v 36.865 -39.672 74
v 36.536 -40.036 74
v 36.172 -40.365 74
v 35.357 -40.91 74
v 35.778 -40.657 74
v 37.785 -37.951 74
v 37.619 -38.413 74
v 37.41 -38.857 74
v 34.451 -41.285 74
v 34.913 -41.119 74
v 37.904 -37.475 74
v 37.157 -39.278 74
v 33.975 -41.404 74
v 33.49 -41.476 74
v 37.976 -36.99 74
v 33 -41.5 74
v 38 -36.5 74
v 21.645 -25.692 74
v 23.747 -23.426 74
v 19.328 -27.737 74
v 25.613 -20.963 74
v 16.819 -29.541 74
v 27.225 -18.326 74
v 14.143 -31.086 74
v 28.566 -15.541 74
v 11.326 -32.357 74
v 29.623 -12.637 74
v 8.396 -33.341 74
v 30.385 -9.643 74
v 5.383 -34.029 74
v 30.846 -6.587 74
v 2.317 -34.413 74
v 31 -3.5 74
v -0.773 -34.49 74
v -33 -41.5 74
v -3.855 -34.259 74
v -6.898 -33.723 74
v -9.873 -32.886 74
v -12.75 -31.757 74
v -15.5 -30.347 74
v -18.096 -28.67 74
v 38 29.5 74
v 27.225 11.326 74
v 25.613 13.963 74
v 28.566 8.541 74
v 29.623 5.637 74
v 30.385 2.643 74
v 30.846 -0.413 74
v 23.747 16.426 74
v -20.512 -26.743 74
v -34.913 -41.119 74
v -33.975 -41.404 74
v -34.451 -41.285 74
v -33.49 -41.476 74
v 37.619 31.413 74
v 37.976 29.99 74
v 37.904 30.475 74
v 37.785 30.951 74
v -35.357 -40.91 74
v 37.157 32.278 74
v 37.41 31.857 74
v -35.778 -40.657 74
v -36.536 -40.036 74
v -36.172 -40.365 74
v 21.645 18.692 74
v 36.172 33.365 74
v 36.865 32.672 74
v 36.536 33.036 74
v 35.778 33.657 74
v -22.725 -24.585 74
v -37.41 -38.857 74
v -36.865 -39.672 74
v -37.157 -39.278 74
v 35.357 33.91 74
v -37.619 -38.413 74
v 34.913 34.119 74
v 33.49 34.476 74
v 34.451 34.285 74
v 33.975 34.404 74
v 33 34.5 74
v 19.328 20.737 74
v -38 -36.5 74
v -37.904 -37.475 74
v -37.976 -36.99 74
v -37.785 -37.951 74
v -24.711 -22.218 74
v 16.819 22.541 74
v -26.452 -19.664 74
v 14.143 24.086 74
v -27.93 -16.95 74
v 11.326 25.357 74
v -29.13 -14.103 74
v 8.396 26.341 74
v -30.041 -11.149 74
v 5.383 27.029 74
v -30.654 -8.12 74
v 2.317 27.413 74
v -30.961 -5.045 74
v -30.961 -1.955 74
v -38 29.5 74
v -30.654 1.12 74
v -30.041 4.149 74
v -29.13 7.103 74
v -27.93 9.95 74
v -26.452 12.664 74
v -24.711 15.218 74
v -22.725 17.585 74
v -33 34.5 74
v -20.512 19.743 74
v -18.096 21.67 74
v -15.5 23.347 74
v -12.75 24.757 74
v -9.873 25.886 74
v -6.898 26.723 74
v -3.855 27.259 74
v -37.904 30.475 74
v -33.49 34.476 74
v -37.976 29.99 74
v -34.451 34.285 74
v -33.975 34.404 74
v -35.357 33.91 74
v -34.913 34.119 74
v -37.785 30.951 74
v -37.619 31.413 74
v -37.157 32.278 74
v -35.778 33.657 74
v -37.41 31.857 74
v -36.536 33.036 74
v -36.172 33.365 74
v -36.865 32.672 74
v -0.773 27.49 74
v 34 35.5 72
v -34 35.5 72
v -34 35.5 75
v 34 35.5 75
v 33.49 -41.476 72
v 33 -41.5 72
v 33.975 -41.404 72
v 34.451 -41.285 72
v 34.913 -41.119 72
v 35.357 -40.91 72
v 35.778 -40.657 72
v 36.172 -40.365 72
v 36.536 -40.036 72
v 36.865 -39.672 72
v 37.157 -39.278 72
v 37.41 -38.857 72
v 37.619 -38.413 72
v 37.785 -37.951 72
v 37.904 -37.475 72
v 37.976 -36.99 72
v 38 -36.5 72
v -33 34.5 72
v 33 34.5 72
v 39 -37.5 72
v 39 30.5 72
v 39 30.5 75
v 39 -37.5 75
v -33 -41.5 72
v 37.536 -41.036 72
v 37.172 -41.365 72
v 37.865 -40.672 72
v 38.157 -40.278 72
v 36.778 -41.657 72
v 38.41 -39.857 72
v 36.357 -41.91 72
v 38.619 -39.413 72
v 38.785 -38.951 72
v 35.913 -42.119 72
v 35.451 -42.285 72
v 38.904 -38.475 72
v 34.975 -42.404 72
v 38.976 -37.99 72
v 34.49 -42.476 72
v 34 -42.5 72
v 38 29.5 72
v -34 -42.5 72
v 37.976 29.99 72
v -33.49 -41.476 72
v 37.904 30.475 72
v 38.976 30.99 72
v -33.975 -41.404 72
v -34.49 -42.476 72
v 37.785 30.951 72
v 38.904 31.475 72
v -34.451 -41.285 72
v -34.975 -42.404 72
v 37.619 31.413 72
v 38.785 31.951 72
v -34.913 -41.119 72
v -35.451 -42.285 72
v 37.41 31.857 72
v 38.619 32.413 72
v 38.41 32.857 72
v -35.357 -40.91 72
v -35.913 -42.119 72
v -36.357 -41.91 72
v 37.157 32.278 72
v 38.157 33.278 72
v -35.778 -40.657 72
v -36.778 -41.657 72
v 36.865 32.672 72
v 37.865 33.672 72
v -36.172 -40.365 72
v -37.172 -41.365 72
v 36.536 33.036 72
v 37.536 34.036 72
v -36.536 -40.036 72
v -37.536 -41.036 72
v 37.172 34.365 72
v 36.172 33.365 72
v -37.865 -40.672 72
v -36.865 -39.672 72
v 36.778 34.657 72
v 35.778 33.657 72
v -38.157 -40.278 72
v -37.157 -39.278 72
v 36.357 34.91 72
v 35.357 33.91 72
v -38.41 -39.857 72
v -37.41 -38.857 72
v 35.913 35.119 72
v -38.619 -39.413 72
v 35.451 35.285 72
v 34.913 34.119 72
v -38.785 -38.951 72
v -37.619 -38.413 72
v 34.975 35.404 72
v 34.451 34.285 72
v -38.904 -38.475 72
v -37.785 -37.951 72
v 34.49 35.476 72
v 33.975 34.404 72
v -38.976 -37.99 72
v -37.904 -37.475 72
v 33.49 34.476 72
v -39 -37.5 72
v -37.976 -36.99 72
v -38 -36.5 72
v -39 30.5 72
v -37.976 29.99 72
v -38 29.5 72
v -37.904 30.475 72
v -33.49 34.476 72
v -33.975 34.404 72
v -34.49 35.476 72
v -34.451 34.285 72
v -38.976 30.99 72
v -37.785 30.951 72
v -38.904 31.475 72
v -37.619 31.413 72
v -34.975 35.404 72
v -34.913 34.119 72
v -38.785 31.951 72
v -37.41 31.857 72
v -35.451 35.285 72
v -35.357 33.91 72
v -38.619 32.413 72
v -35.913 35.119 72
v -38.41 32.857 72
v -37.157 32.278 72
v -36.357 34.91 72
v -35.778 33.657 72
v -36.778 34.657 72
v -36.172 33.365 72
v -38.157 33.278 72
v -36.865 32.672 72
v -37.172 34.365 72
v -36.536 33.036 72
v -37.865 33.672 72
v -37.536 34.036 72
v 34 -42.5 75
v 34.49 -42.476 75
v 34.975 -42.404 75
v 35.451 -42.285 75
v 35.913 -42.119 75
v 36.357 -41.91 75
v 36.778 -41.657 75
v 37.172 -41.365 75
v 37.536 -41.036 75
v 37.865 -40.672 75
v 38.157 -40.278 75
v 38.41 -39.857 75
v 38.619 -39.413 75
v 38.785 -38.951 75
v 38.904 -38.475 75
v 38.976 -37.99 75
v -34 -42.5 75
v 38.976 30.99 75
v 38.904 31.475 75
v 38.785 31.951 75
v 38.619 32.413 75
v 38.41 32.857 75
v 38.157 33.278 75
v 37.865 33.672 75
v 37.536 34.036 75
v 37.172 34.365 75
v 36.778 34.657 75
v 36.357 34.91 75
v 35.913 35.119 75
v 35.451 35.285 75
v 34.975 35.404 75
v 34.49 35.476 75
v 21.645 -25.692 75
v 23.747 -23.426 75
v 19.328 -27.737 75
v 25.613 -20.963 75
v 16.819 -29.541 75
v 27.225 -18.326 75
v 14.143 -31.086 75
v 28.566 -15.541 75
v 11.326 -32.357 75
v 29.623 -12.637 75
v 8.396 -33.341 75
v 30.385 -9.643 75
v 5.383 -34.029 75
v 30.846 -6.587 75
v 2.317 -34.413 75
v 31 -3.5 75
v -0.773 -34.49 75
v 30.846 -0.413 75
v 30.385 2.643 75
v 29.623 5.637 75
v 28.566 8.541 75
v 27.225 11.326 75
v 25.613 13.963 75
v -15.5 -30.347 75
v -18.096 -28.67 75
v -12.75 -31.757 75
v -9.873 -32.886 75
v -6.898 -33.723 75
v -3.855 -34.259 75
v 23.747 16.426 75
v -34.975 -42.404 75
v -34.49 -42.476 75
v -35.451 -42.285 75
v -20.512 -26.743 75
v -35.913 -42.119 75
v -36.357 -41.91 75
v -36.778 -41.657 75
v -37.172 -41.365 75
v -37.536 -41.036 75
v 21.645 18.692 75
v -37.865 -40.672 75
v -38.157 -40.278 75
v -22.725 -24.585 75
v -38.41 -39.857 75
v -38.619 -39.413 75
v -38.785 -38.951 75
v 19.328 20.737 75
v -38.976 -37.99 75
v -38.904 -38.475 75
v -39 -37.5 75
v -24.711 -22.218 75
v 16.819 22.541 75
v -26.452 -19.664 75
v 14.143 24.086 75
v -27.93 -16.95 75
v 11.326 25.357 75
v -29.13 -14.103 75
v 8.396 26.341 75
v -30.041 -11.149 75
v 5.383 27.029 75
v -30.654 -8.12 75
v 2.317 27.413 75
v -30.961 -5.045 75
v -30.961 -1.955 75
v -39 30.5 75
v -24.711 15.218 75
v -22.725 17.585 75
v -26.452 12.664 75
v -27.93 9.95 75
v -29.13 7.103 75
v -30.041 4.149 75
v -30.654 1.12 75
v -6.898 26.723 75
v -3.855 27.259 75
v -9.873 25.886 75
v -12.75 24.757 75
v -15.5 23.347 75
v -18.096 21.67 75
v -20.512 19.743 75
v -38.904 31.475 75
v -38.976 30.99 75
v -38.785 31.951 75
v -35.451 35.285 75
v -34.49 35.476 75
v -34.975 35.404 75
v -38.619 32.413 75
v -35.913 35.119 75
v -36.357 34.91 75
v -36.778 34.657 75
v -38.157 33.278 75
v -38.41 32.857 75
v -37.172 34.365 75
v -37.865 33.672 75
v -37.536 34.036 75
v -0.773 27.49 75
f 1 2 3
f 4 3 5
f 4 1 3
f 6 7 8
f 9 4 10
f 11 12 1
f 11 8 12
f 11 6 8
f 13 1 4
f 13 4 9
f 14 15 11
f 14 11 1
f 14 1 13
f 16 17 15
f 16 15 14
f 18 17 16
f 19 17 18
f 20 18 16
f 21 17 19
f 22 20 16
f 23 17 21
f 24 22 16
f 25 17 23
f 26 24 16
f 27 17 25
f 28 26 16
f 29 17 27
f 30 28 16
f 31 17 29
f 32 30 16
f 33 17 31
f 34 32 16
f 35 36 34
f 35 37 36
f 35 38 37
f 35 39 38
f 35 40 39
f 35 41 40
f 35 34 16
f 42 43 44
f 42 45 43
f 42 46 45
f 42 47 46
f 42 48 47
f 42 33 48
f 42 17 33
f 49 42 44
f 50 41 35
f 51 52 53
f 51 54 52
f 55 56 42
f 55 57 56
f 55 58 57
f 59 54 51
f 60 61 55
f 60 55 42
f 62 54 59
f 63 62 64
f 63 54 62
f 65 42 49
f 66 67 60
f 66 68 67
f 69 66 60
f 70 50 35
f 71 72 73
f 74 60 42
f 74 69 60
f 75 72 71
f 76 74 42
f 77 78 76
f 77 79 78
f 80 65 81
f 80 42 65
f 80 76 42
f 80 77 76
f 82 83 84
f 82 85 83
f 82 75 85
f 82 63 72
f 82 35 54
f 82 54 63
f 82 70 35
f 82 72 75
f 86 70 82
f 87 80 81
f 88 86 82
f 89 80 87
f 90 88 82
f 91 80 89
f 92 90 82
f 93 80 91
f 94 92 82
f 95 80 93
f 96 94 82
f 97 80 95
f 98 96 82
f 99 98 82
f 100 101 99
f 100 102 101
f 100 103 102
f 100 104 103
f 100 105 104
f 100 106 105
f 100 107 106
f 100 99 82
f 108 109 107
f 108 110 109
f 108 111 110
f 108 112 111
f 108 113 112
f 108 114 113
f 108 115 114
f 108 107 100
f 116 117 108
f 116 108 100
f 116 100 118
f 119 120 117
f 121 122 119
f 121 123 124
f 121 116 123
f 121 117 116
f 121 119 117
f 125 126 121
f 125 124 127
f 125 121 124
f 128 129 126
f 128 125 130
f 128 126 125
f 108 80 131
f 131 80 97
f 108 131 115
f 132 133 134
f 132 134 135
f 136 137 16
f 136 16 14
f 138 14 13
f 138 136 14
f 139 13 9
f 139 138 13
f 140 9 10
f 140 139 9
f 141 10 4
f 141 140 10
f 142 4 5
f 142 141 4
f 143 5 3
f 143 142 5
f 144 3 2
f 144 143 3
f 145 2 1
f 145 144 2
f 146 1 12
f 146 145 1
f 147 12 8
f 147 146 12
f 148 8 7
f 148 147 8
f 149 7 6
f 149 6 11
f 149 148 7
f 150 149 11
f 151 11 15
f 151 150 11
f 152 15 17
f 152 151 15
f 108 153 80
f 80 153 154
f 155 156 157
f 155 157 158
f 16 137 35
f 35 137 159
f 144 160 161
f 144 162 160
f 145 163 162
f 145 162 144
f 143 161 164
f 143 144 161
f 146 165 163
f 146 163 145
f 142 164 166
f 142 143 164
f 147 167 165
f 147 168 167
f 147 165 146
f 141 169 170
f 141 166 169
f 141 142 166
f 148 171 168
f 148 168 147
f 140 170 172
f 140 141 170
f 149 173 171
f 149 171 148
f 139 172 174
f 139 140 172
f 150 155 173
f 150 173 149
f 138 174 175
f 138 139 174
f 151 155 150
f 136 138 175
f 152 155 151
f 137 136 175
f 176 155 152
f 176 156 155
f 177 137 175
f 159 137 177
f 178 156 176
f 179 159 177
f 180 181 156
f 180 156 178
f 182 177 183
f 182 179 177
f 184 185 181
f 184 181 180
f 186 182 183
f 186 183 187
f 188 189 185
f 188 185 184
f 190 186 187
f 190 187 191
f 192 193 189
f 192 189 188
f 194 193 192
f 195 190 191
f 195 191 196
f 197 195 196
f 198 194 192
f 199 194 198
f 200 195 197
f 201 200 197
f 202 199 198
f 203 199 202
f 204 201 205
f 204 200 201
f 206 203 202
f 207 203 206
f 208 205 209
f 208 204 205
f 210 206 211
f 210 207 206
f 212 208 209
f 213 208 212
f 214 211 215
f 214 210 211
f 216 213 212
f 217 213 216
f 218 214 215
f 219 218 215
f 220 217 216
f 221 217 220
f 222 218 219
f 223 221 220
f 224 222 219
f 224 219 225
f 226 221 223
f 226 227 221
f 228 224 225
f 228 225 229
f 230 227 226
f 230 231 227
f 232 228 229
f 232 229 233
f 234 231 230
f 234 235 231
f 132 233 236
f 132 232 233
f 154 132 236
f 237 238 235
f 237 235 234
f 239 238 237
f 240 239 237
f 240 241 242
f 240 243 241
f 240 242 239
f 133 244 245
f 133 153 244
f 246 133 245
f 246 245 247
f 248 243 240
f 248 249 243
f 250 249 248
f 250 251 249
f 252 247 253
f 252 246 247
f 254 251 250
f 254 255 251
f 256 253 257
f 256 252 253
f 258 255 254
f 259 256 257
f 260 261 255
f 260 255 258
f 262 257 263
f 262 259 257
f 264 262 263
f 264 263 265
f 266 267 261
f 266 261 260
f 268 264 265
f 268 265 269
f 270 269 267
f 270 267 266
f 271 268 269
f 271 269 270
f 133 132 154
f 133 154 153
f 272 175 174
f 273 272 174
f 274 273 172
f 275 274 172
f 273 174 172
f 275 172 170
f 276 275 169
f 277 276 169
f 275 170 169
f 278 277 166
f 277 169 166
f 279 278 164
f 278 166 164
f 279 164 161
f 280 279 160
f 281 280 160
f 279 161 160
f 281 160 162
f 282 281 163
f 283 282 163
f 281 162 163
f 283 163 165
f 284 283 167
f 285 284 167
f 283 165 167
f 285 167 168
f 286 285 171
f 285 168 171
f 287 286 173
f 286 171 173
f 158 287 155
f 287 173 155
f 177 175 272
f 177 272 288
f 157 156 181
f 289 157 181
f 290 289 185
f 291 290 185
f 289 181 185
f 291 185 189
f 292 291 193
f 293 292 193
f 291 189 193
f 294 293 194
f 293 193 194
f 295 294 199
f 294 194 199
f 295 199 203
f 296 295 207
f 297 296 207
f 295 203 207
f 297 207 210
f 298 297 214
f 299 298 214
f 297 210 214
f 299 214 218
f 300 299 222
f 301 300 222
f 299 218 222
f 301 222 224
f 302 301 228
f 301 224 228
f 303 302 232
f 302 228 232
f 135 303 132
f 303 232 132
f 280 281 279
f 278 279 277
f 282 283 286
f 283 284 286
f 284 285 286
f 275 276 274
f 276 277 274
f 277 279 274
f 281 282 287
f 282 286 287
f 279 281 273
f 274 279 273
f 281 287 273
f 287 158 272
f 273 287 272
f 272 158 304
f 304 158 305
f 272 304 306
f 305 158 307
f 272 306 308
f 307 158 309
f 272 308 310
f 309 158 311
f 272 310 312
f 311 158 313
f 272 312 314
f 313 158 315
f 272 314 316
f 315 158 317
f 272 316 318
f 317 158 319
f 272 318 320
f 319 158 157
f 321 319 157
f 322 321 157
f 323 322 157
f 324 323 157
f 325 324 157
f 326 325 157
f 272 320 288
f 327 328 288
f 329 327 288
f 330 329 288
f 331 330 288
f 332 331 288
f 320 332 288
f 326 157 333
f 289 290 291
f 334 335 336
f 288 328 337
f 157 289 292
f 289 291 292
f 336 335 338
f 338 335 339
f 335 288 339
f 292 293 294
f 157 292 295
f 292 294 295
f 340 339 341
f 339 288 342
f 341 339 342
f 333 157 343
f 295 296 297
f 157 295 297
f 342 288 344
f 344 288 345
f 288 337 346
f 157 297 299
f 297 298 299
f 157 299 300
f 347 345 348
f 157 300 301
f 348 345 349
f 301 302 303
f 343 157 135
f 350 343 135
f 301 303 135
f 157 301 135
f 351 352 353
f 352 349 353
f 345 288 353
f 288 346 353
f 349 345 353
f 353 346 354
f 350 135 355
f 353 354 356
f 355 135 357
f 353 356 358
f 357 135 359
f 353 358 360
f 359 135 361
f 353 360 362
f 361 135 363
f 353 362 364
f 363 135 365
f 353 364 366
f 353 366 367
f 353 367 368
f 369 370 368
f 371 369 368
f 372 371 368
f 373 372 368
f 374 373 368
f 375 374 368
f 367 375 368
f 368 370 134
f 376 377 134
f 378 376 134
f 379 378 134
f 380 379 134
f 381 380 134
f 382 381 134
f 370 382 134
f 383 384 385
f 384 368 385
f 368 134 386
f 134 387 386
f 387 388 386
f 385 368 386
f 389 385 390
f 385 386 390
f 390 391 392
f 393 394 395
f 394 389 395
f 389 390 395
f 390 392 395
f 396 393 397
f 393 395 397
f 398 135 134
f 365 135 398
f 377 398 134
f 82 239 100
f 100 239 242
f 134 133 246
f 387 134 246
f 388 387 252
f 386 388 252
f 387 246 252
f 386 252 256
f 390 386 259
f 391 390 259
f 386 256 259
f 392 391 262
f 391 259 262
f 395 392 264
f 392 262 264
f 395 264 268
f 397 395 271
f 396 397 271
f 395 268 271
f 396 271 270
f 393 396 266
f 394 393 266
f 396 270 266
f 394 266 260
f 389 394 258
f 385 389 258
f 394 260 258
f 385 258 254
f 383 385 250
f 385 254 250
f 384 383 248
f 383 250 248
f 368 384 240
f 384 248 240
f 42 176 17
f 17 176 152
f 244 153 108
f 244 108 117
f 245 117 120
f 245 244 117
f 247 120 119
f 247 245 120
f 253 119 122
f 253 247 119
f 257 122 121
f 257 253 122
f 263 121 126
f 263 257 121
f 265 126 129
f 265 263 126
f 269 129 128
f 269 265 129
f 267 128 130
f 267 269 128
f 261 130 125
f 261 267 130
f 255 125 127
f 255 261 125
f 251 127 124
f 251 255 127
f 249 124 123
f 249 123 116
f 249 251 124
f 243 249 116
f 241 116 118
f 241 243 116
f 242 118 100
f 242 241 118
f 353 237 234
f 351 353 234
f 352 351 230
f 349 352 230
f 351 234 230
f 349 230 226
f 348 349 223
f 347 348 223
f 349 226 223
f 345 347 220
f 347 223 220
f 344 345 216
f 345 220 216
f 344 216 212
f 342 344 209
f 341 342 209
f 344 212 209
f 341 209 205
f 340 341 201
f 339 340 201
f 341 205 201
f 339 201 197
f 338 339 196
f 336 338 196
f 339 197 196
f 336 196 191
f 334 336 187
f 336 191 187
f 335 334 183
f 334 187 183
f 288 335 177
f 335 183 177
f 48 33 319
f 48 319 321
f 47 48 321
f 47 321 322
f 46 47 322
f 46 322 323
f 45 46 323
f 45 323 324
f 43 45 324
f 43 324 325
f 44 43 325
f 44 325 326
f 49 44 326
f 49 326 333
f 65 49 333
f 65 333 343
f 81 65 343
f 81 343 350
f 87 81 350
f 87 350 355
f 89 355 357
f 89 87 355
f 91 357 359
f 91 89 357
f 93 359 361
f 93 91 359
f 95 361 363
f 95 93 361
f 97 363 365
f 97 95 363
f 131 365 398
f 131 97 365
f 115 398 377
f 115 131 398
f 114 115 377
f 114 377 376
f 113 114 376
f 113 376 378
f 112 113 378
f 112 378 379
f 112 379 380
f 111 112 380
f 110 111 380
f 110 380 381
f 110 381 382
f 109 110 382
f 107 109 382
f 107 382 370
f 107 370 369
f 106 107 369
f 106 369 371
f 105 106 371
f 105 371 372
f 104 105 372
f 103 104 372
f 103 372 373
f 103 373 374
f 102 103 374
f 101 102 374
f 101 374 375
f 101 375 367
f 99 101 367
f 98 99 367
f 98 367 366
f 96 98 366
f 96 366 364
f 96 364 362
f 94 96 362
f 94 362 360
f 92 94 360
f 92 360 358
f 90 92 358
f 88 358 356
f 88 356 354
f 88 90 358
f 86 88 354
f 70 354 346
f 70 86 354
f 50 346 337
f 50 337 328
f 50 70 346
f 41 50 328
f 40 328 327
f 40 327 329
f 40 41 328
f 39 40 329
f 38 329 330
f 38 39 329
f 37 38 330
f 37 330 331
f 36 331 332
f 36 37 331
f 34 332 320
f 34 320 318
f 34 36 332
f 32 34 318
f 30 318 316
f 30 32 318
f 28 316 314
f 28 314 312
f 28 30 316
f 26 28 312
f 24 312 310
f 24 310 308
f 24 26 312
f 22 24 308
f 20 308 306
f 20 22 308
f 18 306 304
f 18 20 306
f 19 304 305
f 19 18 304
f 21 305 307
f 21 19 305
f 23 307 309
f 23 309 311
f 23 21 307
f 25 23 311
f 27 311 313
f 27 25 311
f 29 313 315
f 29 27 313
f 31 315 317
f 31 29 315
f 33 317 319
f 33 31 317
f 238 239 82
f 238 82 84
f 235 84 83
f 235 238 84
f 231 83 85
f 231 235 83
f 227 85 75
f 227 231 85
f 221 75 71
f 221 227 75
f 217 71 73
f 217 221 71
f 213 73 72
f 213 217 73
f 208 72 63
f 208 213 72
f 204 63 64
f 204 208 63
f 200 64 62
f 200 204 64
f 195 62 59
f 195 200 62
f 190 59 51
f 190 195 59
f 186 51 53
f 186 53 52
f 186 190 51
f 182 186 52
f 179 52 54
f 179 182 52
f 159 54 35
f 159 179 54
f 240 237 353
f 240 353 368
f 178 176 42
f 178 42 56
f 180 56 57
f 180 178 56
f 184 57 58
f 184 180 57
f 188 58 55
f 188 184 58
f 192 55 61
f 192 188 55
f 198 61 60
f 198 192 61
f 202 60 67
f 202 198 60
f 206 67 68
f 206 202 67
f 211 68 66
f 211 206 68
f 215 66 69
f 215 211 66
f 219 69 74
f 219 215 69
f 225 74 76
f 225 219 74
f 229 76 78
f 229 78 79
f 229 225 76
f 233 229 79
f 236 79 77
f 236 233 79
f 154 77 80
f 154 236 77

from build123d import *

# Parameters (mm, degrees)
EXTRUDE047_DEPTH = 3
SKETCH018_R      = 31
EXTRUDE046_DEPTH = 3


with BuildPart() as extrude047:
    # Sketch019 → Extrude047 (new body)
    with BuildSketch(Plane.XY.offset(80)):
        with BuildLine():
            Line((-33, 38), (33, 38))
            ThreePointArc((38, 33), (36.535534, 36.535534), (33, 38))
            Line((38, 33), (38, -33))
            ThreePointArc((33, -38), (36.535534, -36.535534), (38, -33))
            Line((33, -38), (-33, -38))
            ThreePointArc((-38, -33), (-36.535534, -36.535534), (-33, -38))
            Line((-38, -33), (-38, 33))
            ThreePointArc((-33, 38), (-36.535534, 36.535534), (-38, 33))
        make_face()
    extrude(amount=EXTRUDE047_DEPTH)


with BuildPart() as extrude047_1:
    # Extrude047 placement: moved
    add(extrude047.part.moved(Location((0, -3.5, 30))))


with BuildPart() as grill:
    # Sketch018 → Extrude046 (new body)
    with BuildSketch(Plane.XY.offset(80)):
        with BuildLine():
            Line((-34, 39), (34, 39))
            ThreePointArc((39, 34), (37.535534, 37.535534), (34, 39))
            Line((39, 34), (39, -34))
            ThreePointArc((34, -39), (37.535534, -37.535534), (39, -34))
            Line((34, -39), (-34, -39))
            ThreePointArc((-39, -34), (-37.535534, -37.535534), (-34, -39))
            Line((-39, -34), (-39, 34))
            ThreePointArc((-34, 39), (-37.535534, 37.535534), (-39, 34))
        make_face()
        Circle(SKETCH018_R, mode=Mode.SUBTRACT)
    extrude(amount=EXTRUDE046_DEPTH)


with BuildPart() as grill_1:
    # Extrude046 placement: moved
    add(grill.part.moved(Location((0, -3.5, 31))))

    # Cut022: cut Extrude047
    add(extrude047_1.part, mode=Mode.SUBTRACT)


with BuildPart() as grill_2:
    # Cut022 placement: moved
    add(grill_1.part.moved(Location((0, 0, -39))))


solid = grill_2.part
